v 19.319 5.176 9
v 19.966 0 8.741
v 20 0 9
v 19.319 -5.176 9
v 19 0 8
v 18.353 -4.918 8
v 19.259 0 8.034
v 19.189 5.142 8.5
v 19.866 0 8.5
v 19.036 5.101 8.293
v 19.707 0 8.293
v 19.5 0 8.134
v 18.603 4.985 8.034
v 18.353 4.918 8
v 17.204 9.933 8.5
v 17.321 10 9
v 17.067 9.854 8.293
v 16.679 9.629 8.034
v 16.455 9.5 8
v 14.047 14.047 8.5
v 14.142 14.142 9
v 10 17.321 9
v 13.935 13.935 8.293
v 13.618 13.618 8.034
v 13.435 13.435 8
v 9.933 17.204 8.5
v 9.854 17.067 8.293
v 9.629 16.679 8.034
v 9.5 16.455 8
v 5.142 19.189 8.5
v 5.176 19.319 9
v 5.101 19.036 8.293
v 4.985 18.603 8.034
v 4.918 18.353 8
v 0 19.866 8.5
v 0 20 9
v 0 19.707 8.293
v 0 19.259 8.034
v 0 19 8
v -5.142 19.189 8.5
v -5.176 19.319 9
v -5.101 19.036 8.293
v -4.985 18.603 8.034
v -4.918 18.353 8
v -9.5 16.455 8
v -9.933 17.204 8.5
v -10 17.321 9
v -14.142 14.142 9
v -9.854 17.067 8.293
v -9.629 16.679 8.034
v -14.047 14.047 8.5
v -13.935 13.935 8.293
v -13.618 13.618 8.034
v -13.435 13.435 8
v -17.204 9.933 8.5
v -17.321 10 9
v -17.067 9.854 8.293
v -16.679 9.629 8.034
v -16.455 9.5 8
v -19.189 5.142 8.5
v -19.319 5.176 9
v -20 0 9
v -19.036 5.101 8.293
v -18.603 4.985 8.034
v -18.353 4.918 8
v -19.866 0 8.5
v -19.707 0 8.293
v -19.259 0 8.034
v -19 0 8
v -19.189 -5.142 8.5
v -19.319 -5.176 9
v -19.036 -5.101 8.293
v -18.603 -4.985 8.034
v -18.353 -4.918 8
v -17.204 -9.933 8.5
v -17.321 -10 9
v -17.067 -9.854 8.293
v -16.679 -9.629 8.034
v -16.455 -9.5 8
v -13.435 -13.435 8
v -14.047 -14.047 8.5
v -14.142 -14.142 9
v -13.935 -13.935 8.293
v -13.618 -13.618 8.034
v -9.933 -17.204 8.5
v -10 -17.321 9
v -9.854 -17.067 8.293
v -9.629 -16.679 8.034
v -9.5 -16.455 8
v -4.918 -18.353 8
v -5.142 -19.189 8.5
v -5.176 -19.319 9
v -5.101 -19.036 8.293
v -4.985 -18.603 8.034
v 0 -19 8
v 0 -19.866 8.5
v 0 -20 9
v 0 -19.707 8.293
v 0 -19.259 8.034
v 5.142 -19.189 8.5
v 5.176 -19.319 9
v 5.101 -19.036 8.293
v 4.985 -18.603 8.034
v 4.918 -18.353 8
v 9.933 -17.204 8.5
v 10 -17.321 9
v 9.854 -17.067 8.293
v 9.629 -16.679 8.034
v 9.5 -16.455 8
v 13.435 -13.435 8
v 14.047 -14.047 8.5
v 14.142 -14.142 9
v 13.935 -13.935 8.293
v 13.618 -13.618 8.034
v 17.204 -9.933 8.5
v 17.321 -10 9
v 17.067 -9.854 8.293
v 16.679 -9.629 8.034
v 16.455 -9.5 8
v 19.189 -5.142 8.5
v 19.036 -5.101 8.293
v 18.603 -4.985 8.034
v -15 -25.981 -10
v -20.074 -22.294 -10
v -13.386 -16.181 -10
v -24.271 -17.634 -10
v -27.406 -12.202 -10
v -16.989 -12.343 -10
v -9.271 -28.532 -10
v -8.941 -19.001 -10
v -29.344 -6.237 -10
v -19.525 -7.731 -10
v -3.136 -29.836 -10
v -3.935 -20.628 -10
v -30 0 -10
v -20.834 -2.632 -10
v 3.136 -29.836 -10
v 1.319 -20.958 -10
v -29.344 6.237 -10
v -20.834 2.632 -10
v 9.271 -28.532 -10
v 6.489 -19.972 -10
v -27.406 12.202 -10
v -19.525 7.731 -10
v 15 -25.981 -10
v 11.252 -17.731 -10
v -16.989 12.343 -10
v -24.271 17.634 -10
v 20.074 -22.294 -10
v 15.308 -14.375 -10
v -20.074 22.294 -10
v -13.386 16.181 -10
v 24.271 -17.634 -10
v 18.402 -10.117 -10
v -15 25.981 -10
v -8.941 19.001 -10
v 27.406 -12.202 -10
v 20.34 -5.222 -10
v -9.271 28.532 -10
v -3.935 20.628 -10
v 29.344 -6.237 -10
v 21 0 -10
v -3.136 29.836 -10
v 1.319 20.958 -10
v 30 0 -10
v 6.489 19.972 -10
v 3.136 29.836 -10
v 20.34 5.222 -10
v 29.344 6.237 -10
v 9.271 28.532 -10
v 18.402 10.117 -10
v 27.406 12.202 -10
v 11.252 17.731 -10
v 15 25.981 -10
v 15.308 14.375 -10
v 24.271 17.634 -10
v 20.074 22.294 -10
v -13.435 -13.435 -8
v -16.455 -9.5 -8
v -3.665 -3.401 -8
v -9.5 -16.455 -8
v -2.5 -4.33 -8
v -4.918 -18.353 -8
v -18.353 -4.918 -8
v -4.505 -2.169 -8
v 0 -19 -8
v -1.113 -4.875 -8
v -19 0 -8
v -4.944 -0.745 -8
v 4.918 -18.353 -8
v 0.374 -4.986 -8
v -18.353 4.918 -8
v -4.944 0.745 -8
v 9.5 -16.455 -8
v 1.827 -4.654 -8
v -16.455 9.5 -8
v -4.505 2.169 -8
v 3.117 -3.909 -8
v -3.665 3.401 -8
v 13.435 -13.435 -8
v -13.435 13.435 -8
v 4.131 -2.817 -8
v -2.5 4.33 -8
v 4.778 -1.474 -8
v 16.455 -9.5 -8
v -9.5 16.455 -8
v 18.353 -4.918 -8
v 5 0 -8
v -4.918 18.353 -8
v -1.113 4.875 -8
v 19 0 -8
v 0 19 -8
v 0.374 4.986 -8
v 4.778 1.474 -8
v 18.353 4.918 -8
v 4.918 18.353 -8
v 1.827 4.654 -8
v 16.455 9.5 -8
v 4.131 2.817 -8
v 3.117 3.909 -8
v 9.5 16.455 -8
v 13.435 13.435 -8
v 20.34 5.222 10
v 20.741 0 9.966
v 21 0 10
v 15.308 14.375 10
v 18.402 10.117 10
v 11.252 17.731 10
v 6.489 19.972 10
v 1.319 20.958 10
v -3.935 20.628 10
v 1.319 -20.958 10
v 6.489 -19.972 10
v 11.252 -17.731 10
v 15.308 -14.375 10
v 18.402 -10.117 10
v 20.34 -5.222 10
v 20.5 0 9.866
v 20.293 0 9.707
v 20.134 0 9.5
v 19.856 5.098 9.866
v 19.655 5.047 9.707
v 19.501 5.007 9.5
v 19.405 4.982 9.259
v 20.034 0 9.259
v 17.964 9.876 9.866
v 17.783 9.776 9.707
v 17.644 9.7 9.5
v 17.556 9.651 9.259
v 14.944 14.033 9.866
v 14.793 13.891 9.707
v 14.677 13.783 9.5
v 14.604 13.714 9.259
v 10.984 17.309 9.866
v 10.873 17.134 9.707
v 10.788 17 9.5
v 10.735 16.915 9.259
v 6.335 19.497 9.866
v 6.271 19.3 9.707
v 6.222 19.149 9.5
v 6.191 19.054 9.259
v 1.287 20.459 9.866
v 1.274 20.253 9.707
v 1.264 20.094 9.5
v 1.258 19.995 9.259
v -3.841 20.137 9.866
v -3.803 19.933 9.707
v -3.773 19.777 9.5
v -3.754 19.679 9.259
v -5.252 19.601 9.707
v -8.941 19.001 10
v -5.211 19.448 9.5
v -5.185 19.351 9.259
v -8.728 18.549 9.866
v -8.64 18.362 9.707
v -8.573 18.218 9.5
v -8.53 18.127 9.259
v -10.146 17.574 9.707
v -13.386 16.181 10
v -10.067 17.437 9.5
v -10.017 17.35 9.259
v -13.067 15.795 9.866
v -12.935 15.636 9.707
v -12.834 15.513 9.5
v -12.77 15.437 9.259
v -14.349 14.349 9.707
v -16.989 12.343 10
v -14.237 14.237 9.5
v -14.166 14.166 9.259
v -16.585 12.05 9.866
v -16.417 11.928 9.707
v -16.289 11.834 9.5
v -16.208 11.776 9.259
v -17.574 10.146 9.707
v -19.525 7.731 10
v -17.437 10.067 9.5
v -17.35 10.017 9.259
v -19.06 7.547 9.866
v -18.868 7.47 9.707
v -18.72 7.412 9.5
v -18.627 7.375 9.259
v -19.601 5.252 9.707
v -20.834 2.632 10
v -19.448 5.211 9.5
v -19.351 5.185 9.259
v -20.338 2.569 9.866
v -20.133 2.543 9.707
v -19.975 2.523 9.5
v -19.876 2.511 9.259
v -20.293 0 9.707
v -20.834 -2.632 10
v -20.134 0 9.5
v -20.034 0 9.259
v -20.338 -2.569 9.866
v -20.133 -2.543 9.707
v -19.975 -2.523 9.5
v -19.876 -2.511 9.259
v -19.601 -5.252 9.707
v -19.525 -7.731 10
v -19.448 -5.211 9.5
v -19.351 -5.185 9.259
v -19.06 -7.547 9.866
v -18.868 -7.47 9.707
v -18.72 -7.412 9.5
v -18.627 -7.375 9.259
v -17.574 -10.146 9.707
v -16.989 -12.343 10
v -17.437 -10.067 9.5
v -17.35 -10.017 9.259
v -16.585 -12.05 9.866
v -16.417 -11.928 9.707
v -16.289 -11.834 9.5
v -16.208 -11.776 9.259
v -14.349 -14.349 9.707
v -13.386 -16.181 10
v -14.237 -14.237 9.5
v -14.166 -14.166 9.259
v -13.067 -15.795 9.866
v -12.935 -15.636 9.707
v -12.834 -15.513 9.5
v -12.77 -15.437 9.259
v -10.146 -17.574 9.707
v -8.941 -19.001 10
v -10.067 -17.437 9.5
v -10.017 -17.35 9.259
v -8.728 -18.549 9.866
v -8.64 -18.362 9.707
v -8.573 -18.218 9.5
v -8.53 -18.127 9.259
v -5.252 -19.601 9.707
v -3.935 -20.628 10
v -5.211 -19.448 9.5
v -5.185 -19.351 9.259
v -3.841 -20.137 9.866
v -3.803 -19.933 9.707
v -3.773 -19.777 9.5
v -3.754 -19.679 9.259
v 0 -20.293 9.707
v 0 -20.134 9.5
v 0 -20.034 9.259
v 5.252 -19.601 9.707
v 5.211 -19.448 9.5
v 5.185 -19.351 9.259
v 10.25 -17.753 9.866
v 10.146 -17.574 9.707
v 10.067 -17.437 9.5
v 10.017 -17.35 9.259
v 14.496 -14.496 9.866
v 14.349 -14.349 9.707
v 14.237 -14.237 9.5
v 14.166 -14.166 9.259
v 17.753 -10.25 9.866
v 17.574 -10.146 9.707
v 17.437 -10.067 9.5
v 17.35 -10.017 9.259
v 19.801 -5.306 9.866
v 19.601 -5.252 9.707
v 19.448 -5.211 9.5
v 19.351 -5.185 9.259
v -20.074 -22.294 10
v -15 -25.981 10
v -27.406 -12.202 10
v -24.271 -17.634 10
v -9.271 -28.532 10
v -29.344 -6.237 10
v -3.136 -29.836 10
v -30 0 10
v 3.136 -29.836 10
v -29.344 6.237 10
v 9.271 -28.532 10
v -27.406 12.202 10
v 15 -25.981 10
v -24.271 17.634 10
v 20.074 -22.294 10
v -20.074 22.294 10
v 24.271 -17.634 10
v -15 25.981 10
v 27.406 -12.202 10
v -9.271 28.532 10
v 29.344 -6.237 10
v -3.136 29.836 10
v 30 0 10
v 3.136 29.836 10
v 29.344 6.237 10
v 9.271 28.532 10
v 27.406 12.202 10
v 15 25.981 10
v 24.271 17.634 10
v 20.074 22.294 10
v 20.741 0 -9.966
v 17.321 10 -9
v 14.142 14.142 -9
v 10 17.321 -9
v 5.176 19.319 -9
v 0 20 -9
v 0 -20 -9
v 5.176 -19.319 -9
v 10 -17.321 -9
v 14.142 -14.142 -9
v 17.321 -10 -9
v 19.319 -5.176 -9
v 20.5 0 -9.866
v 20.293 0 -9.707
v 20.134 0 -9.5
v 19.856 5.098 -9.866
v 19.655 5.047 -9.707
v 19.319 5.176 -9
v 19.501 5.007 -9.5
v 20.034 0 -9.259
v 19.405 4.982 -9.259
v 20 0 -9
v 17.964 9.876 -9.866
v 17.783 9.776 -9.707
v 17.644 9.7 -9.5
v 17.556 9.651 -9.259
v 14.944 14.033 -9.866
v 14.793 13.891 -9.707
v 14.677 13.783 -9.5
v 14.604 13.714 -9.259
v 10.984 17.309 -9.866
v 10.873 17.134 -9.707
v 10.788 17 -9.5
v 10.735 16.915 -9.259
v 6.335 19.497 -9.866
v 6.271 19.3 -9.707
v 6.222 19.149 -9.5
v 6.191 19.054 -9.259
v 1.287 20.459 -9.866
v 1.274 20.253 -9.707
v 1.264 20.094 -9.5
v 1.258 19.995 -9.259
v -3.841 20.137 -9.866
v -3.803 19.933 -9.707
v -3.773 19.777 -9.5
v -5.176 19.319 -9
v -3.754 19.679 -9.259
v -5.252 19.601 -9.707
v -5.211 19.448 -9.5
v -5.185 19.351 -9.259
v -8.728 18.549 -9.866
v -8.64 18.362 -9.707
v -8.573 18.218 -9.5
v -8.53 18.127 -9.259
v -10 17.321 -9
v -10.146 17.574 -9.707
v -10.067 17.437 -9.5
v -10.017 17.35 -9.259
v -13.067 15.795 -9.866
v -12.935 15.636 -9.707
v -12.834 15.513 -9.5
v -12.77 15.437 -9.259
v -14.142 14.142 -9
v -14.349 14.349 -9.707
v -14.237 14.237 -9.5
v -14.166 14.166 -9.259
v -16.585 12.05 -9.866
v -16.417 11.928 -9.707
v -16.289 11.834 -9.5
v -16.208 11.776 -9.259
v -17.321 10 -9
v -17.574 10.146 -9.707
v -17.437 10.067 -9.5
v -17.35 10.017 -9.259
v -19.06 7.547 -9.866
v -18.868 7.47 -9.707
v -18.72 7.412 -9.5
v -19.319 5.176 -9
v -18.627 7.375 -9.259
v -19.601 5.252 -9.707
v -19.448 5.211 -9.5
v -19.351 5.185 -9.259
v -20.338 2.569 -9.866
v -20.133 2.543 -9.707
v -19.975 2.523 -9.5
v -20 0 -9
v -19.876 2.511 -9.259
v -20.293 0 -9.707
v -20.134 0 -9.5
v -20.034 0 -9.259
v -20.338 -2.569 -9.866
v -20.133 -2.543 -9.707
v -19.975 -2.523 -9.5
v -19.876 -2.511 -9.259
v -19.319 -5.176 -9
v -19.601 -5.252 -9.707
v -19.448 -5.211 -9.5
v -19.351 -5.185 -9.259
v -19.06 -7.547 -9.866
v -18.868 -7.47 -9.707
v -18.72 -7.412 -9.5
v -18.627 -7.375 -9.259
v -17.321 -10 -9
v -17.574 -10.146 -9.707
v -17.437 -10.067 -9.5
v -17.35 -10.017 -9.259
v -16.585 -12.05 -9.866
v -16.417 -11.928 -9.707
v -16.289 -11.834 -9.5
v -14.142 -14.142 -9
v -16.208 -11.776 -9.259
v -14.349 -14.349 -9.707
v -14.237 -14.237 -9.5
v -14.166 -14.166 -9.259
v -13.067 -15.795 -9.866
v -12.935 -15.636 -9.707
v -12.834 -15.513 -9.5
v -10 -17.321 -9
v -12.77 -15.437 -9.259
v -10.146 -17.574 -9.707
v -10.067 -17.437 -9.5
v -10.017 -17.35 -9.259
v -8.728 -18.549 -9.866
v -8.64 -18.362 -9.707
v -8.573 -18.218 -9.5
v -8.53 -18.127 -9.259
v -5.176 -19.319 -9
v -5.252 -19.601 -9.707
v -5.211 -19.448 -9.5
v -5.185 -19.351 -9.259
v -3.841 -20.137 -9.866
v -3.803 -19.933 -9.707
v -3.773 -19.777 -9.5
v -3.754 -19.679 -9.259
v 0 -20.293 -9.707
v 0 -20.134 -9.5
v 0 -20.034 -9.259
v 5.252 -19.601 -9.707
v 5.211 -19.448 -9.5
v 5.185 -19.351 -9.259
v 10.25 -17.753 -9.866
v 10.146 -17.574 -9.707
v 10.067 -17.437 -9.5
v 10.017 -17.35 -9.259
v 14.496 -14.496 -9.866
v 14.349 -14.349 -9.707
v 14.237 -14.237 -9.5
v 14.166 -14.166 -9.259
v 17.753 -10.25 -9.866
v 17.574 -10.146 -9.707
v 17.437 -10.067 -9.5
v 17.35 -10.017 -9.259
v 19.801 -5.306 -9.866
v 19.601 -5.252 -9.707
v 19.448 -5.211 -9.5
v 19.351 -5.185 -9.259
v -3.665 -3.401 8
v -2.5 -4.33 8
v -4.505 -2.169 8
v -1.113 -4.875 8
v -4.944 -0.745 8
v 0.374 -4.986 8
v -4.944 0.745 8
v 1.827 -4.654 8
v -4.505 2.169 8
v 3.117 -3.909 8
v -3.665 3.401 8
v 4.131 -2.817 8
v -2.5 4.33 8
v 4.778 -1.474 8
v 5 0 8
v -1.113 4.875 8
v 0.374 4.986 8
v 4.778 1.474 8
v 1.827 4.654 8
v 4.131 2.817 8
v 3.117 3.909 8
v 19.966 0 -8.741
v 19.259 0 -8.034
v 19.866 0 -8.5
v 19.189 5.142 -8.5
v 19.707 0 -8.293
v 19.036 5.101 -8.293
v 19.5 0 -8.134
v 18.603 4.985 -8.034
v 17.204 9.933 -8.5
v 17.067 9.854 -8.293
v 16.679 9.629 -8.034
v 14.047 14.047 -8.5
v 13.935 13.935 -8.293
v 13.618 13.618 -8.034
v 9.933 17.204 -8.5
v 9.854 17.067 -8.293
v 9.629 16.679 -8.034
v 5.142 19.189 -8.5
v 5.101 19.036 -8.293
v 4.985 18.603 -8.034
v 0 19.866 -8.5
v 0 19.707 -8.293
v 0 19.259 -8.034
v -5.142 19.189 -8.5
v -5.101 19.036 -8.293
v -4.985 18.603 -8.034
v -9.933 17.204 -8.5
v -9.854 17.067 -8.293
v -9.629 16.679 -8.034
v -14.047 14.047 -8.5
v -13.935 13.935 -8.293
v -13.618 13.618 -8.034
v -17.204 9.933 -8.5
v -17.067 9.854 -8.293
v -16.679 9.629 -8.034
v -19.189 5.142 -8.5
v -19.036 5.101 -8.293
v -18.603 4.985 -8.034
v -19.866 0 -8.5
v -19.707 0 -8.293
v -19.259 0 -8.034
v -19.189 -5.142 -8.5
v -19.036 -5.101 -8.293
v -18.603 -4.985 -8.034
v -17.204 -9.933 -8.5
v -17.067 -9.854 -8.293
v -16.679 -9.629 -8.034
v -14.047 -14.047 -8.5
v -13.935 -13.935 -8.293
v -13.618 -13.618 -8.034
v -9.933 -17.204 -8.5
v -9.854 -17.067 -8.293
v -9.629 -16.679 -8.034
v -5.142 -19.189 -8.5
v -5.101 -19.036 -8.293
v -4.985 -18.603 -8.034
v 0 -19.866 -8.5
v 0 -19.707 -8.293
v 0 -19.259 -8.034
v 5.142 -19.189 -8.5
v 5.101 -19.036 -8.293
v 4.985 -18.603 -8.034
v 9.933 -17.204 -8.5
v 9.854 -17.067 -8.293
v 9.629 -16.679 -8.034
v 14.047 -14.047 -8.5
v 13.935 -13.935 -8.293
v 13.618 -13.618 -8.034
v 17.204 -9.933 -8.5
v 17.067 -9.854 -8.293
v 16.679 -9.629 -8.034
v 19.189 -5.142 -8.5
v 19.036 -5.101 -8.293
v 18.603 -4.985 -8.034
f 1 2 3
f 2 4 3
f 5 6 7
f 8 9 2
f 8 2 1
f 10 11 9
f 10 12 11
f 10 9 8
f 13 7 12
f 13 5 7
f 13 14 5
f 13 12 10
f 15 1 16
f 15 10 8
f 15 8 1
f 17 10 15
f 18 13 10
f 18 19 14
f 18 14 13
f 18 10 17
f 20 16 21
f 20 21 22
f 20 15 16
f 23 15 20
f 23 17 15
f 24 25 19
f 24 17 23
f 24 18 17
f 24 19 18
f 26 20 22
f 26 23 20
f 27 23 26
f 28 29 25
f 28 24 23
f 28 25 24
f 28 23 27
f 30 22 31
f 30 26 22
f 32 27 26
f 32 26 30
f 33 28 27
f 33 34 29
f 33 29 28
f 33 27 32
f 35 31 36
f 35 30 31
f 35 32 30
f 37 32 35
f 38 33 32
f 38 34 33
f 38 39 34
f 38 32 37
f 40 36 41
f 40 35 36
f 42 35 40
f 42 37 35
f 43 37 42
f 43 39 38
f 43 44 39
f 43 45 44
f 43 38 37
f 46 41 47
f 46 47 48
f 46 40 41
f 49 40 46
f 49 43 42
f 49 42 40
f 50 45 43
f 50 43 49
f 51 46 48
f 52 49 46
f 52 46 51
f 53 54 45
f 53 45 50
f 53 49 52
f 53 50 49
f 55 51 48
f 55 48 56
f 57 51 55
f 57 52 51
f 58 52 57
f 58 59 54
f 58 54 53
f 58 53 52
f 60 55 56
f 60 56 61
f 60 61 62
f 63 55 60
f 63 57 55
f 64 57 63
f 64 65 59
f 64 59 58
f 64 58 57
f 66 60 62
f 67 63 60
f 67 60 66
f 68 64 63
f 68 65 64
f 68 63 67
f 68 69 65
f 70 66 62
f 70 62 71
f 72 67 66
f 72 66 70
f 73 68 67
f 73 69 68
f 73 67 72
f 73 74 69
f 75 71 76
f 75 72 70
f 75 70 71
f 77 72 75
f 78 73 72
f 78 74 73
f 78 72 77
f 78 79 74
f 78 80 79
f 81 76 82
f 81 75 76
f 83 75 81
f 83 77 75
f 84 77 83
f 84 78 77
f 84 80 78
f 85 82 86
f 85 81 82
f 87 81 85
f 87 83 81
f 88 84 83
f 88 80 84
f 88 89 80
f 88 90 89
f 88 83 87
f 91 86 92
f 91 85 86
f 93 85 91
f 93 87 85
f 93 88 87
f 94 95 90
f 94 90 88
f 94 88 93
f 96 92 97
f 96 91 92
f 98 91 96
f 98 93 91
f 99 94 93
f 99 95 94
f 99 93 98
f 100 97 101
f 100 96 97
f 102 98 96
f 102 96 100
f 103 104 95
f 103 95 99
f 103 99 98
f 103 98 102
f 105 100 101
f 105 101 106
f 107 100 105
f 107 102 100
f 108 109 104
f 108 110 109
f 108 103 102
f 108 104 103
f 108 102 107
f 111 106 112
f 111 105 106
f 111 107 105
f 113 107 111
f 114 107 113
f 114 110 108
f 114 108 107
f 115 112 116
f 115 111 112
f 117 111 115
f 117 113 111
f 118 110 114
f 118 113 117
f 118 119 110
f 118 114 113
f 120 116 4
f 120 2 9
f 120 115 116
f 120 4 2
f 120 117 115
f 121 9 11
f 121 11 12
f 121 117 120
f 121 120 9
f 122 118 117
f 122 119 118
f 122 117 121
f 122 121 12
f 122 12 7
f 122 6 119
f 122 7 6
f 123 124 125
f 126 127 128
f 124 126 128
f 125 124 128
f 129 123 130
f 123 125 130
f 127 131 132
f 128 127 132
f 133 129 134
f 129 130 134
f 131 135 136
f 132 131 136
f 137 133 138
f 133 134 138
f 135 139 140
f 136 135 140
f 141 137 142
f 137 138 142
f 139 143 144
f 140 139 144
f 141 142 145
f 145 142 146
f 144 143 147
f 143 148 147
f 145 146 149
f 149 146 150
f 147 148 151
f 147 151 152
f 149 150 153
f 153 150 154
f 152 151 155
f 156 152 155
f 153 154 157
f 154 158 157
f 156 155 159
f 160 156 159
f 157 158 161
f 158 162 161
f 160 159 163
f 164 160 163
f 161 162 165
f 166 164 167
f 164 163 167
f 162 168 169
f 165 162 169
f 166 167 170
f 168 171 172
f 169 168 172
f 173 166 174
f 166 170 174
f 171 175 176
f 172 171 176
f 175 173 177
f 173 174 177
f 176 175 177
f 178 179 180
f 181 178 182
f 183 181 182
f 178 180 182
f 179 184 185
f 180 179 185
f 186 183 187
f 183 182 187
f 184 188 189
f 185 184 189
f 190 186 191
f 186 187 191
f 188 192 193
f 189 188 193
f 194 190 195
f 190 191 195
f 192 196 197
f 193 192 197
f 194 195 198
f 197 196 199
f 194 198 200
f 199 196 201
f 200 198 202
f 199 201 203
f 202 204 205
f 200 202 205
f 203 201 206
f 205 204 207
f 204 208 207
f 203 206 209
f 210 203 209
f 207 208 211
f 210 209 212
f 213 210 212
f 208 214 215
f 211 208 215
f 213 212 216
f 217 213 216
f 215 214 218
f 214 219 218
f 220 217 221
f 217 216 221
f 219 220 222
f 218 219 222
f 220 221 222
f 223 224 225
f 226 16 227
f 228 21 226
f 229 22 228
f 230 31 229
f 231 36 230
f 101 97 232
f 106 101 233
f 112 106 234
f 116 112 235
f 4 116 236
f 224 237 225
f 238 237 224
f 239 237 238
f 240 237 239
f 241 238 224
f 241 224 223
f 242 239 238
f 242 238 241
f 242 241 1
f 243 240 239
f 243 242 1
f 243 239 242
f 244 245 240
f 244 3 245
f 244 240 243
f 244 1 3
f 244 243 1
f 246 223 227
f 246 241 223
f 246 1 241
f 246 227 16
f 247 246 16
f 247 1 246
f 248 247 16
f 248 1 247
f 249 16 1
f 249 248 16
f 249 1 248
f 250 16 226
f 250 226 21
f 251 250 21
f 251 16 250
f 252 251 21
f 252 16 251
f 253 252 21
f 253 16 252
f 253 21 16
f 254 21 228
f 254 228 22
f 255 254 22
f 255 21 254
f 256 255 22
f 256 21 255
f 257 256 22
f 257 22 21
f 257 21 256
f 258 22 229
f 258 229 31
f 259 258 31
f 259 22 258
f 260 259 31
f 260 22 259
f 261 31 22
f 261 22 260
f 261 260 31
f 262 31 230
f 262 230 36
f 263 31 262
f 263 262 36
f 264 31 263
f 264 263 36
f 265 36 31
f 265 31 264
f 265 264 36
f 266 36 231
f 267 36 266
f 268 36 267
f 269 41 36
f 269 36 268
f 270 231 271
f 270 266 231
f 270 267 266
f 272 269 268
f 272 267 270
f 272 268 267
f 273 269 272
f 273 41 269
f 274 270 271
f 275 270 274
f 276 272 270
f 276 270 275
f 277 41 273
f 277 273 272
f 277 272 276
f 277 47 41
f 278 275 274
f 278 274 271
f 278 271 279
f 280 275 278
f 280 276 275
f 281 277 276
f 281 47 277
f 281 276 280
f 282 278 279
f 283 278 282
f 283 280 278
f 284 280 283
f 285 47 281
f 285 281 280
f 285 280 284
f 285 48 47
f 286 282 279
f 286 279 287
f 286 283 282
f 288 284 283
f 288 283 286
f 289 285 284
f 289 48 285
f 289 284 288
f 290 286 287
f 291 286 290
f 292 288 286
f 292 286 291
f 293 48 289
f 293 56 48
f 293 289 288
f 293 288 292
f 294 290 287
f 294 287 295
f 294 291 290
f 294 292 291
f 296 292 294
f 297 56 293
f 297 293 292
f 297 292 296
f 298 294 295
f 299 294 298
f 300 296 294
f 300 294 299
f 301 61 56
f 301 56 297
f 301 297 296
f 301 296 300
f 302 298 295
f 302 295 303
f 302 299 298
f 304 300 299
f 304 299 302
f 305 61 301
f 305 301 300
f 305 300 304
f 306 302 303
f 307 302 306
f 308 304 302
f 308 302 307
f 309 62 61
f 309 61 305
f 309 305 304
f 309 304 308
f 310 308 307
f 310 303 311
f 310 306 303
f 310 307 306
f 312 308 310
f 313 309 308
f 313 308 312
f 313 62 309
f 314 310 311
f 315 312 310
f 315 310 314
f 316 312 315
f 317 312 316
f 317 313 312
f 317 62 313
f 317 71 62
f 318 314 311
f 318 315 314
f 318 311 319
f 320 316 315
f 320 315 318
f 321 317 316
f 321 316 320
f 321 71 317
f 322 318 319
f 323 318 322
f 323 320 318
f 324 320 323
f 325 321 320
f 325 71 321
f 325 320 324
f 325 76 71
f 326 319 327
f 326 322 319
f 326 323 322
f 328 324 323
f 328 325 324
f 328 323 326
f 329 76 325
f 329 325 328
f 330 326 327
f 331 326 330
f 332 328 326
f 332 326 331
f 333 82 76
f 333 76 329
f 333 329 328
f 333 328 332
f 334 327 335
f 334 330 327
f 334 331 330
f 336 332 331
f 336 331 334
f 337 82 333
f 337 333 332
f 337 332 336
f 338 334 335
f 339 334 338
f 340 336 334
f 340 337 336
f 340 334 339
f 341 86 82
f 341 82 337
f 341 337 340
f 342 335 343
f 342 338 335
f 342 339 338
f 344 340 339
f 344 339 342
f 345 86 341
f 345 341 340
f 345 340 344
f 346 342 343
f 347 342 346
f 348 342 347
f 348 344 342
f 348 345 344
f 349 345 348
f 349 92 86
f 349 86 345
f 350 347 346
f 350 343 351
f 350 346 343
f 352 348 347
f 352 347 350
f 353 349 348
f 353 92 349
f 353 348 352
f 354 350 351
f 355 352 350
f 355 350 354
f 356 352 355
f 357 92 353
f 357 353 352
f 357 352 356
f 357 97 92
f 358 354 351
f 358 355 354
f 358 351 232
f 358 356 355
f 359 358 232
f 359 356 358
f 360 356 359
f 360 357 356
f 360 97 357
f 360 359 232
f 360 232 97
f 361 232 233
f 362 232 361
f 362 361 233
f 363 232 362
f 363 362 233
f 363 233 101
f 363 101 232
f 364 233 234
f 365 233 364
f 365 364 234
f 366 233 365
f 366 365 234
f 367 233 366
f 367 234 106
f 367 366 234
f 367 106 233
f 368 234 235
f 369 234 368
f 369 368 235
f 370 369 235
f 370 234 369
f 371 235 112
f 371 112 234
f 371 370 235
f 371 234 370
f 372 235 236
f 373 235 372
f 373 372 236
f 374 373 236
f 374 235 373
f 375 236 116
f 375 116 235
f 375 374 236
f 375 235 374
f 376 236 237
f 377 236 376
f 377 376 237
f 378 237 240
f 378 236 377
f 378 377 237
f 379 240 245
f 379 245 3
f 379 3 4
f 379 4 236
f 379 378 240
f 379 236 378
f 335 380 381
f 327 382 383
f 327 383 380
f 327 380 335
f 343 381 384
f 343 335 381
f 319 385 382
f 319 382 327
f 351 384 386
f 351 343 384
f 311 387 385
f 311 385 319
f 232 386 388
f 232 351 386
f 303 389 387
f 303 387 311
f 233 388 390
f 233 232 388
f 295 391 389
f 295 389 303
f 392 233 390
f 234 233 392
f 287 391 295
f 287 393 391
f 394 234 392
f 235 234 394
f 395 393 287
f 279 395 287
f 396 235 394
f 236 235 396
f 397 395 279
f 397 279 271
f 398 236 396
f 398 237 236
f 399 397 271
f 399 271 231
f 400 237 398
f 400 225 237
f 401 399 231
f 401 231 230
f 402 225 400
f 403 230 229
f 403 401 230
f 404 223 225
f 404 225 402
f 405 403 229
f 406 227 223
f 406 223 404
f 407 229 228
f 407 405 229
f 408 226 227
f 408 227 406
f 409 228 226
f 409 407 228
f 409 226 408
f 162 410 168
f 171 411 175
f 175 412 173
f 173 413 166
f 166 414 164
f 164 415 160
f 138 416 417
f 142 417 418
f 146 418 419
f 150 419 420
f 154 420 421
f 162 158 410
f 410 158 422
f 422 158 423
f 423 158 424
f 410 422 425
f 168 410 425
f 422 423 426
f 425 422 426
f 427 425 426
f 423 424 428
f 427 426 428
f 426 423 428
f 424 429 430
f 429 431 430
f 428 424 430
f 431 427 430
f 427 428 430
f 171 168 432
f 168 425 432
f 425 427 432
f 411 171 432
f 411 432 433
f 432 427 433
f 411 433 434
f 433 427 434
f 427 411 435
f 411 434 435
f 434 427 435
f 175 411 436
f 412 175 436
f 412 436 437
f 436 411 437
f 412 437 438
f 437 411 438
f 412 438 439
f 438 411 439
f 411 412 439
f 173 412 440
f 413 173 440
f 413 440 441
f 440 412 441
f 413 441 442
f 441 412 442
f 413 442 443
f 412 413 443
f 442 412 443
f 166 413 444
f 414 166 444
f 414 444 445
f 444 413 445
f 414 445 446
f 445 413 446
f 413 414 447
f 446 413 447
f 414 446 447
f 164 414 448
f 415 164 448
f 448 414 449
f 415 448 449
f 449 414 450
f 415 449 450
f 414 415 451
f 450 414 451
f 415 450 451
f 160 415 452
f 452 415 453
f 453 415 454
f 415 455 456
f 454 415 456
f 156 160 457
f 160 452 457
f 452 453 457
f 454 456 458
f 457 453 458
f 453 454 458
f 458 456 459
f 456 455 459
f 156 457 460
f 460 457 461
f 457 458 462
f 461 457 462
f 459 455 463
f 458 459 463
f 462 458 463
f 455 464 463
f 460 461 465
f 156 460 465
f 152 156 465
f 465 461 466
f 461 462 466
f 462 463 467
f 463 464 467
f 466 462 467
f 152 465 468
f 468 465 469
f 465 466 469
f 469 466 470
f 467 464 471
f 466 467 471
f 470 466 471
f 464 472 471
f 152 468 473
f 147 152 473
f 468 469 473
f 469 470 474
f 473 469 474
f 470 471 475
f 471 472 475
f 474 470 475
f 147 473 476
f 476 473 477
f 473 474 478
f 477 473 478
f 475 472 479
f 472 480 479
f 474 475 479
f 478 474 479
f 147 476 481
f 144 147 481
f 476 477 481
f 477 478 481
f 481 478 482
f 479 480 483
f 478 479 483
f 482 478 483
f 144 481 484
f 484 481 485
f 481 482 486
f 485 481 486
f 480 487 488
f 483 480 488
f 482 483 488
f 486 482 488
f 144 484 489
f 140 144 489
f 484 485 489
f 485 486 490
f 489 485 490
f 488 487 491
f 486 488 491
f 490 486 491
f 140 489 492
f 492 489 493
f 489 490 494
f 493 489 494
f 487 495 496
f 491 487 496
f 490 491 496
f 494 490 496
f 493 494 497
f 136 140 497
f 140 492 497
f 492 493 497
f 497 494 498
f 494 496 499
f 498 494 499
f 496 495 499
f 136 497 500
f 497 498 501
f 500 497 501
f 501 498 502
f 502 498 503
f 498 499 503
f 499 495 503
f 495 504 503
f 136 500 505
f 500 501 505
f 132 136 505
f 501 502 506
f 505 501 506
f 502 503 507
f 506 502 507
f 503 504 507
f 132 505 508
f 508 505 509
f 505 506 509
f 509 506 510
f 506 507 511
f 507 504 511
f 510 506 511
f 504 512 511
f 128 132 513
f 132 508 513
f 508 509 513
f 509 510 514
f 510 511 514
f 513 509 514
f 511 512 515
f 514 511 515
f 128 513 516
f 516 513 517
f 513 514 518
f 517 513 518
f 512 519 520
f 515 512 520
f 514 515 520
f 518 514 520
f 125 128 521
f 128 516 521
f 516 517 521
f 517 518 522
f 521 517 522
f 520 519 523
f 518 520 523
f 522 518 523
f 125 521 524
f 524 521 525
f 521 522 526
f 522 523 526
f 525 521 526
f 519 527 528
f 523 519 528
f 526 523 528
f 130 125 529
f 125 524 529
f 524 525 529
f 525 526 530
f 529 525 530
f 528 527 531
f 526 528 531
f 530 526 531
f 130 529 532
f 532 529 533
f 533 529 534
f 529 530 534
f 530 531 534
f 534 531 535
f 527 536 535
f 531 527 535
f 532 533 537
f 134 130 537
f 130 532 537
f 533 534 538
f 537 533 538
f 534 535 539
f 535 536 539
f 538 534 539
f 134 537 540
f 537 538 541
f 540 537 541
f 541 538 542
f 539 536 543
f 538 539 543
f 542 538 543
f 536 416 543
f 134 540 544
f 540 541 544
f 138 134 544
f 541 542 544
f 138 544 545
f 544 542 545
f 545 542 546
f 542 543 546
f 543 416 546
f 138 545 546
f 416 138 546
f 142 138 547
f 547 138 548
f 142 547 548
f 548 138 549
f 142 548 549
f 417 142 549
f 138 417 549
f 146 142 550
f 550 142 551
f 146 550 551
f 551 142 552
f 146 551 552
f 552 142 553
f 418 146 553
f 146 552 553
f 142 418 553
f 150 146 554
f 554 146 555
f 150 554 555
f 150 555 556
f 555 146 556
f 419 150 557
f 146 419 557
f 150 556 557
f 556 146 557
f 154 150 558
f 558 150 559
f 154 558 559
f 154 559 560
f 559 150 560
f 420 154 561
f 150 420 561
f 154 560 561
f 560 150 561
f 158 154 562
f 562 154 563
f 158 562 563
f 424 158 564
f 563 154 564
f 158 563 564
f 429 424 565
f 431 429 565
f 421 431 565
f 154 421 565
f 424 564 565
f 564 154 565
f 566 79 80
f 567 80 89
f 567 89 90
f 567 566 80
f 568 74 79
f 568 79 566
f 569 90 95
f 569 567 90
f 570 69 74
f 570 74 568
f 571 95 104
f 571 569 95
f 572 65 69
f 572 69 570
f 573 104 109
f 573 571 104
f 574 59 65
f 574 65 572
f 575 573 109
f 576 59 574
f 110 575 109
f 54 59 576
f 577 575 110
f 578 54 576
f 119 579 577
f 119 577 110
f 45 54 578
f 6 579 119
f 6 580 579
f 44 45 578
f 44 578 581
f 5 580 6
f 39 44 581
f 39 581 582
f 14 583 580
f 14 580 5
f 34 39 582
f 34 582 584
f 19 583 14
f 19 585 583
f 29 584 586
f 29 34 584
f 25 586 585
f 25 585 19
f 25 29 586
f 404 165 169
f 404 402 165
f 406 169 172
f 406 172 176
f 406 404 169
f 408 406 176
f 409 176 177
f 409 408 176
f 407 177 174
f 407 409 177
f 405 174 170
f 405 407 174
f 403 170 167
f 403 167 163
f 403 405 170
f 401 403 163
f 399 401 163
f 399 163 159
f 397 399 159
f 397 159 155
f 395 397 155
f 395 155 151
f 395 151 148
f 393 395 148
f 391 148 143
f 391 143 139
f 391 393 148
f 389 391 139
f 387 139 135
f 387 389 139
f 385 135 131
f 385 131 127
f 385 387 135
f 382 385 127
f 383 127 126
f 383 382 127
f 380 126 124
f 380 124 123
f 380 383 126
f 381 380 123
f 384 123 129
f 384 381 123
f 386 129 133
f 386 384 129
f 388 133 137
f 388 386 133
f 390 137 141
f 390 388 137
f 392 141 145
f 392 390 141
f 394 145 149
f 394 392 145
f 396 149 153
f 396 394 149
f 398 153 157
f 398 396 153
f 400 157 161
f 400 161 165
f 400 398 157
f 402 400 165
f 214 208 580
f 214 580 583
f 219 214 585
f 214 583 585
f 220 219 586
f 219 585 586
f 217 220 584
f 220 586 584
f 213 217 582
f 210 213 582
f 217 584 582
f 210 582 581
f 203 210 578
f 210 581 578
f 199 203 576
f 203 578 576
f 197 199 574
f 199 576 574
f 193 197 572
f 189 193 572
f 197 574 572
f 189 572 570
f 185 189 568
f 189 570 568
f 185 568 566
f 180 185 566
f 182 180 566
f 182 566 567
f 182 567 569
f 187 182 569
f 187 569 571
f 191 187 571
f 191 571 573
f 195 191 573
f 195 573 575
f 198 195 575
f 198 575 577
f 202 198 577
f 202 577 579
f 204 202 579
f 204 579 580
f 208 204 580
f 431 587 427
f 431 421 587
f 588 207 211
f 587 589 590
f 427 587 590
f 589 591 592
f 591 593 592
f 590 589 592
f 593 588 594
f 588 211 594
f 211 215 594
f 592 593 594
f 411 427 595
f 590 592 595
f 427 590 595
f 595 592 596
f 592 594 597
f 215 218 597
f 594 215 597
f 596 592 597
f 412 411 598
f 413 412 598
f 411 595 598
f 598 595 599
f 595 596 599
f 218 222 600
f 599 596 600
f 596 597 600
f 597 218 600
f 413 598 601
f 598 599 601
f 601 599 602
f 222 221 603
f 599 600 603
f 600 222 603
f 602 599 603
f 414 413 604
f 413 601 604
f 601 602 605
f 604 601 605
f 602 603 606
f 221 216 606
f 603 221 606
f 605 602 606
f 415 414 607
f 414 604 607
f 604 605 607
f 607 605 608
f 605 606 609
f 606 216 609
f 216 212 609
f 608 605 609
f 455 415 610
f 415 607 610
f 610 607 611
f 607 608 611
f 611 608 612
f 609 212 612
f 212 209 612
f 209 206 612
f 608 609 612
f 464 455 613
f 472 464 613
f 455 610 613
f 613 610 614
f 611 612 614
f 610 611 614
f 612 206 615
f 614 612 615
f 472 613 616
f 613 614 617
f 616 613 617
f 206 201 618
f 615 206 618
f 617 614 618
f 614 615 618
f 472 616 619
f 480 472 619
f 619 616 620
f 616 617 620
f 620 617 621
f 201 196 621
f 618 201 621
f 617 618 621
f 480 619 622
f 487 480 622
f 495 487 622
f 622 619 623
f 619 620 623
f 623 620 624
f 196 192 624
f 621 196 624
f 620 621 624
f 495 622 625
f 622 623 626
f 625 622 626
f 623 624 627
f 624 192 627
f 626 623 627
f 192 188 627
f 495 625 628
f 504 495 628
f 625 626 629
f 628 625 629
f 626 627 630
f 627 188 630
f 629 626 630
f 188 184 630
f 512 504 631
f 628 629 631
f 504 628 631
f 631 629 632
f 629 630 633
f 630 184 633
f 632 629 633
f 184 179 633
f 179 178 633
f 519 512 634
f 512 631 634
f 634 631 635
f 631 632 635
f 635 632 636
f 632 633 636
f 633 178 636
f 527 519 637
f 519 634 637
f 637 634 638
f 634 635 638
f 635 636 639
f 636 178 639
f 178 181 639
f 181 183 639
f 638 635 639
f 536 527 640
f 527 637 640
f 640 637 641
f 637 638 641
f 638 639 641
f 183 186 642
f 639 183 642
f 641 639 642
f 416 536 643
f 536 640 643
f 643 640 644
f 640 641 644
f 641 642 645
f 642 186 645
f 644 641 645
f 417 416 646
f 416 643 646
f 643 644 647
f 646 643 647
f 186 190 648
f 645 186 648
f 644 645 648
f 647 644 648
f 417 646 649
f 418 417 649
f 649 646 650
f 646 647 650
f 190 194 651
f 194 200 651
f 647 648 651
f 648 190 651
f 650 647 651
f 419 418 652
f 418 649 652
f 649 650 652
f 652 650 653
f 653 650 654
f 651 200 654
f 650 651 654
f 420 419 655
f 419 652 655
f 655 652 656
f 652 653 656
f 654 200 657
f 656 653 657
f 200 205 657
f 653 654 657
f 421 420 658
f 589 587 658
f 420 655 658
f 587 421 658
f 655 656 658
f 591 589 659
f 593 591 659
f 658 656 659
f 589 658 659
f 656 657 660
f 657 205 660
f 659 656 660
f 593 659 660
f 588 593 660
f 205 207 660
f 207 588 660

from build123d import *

# Parameters (mm, degrees)
SKETCH1_R           = 30
BOSS_EXTRUDE1_DEPTH = 10
SKETCH2_R           = 20
CUT_EXTRUDE1_DEPTH  = 2
FILLET1_R           = 1
CUT_EXTRUDE2_REACH  = 48.087
SKETCH3_R           = 5


with BuildPart() as part:
    # Sketch1 → Boss-Extrude1 (new, symmetric)
    with BuildSketch(Plane.XY):
        Circle(SKETCH1_R)
    extrude(amount=BOSS_EXTRUDE1_DEPTH, both=True)

    # Sketch2 → Cut-Extrude1 (cut)
    with BuildSketch(Plane.XY.offset(10)):
        Circle(SKETCH2_R)
    cut_extrude1 = extrude(amount=-CUT_EXTRUDE1_DEPTH, mode=Mode.SUBTRACT)

    # Mirror1: Cut-Extrude1 across plane
    add(cut_extrude1.mirror(Plane.XY), mode=Mode.SUBTRACT)

    # Fillet1
    fillet1_edges = [part.edges().sort_by_distance(p)[0] for p in [
        (-20, 0, -10),
        (-20, 0, -8),
        (-20, 0, 8),
        (-20, 0, 10),
    ]]
    fillet(fillet1_edges, radius=FILLET1_R - 0.0001)  # a hair under: the kernel refuses the full size

    # Sketch3 → Cut-Extrude2 (cut, up to next)
    with BuildSketch(Plane.XY.offset(8), mode=Mode.PRIVATE) as cut_extrude2_sk1:
        Circle(SKETCH3_R)
    cut_extrude2_tool1 = extrude(cut_extrude2_sk1.sketch, amount=-CUT_EXTRUDE2_REACH, mode=Mode.PRIVATE) & part.part
    add(cut_extrude2_tool1.solids().sort_by_distance((0, 0, 8))[0], mode=Mode.SUBTRACT)


solid = part.part
